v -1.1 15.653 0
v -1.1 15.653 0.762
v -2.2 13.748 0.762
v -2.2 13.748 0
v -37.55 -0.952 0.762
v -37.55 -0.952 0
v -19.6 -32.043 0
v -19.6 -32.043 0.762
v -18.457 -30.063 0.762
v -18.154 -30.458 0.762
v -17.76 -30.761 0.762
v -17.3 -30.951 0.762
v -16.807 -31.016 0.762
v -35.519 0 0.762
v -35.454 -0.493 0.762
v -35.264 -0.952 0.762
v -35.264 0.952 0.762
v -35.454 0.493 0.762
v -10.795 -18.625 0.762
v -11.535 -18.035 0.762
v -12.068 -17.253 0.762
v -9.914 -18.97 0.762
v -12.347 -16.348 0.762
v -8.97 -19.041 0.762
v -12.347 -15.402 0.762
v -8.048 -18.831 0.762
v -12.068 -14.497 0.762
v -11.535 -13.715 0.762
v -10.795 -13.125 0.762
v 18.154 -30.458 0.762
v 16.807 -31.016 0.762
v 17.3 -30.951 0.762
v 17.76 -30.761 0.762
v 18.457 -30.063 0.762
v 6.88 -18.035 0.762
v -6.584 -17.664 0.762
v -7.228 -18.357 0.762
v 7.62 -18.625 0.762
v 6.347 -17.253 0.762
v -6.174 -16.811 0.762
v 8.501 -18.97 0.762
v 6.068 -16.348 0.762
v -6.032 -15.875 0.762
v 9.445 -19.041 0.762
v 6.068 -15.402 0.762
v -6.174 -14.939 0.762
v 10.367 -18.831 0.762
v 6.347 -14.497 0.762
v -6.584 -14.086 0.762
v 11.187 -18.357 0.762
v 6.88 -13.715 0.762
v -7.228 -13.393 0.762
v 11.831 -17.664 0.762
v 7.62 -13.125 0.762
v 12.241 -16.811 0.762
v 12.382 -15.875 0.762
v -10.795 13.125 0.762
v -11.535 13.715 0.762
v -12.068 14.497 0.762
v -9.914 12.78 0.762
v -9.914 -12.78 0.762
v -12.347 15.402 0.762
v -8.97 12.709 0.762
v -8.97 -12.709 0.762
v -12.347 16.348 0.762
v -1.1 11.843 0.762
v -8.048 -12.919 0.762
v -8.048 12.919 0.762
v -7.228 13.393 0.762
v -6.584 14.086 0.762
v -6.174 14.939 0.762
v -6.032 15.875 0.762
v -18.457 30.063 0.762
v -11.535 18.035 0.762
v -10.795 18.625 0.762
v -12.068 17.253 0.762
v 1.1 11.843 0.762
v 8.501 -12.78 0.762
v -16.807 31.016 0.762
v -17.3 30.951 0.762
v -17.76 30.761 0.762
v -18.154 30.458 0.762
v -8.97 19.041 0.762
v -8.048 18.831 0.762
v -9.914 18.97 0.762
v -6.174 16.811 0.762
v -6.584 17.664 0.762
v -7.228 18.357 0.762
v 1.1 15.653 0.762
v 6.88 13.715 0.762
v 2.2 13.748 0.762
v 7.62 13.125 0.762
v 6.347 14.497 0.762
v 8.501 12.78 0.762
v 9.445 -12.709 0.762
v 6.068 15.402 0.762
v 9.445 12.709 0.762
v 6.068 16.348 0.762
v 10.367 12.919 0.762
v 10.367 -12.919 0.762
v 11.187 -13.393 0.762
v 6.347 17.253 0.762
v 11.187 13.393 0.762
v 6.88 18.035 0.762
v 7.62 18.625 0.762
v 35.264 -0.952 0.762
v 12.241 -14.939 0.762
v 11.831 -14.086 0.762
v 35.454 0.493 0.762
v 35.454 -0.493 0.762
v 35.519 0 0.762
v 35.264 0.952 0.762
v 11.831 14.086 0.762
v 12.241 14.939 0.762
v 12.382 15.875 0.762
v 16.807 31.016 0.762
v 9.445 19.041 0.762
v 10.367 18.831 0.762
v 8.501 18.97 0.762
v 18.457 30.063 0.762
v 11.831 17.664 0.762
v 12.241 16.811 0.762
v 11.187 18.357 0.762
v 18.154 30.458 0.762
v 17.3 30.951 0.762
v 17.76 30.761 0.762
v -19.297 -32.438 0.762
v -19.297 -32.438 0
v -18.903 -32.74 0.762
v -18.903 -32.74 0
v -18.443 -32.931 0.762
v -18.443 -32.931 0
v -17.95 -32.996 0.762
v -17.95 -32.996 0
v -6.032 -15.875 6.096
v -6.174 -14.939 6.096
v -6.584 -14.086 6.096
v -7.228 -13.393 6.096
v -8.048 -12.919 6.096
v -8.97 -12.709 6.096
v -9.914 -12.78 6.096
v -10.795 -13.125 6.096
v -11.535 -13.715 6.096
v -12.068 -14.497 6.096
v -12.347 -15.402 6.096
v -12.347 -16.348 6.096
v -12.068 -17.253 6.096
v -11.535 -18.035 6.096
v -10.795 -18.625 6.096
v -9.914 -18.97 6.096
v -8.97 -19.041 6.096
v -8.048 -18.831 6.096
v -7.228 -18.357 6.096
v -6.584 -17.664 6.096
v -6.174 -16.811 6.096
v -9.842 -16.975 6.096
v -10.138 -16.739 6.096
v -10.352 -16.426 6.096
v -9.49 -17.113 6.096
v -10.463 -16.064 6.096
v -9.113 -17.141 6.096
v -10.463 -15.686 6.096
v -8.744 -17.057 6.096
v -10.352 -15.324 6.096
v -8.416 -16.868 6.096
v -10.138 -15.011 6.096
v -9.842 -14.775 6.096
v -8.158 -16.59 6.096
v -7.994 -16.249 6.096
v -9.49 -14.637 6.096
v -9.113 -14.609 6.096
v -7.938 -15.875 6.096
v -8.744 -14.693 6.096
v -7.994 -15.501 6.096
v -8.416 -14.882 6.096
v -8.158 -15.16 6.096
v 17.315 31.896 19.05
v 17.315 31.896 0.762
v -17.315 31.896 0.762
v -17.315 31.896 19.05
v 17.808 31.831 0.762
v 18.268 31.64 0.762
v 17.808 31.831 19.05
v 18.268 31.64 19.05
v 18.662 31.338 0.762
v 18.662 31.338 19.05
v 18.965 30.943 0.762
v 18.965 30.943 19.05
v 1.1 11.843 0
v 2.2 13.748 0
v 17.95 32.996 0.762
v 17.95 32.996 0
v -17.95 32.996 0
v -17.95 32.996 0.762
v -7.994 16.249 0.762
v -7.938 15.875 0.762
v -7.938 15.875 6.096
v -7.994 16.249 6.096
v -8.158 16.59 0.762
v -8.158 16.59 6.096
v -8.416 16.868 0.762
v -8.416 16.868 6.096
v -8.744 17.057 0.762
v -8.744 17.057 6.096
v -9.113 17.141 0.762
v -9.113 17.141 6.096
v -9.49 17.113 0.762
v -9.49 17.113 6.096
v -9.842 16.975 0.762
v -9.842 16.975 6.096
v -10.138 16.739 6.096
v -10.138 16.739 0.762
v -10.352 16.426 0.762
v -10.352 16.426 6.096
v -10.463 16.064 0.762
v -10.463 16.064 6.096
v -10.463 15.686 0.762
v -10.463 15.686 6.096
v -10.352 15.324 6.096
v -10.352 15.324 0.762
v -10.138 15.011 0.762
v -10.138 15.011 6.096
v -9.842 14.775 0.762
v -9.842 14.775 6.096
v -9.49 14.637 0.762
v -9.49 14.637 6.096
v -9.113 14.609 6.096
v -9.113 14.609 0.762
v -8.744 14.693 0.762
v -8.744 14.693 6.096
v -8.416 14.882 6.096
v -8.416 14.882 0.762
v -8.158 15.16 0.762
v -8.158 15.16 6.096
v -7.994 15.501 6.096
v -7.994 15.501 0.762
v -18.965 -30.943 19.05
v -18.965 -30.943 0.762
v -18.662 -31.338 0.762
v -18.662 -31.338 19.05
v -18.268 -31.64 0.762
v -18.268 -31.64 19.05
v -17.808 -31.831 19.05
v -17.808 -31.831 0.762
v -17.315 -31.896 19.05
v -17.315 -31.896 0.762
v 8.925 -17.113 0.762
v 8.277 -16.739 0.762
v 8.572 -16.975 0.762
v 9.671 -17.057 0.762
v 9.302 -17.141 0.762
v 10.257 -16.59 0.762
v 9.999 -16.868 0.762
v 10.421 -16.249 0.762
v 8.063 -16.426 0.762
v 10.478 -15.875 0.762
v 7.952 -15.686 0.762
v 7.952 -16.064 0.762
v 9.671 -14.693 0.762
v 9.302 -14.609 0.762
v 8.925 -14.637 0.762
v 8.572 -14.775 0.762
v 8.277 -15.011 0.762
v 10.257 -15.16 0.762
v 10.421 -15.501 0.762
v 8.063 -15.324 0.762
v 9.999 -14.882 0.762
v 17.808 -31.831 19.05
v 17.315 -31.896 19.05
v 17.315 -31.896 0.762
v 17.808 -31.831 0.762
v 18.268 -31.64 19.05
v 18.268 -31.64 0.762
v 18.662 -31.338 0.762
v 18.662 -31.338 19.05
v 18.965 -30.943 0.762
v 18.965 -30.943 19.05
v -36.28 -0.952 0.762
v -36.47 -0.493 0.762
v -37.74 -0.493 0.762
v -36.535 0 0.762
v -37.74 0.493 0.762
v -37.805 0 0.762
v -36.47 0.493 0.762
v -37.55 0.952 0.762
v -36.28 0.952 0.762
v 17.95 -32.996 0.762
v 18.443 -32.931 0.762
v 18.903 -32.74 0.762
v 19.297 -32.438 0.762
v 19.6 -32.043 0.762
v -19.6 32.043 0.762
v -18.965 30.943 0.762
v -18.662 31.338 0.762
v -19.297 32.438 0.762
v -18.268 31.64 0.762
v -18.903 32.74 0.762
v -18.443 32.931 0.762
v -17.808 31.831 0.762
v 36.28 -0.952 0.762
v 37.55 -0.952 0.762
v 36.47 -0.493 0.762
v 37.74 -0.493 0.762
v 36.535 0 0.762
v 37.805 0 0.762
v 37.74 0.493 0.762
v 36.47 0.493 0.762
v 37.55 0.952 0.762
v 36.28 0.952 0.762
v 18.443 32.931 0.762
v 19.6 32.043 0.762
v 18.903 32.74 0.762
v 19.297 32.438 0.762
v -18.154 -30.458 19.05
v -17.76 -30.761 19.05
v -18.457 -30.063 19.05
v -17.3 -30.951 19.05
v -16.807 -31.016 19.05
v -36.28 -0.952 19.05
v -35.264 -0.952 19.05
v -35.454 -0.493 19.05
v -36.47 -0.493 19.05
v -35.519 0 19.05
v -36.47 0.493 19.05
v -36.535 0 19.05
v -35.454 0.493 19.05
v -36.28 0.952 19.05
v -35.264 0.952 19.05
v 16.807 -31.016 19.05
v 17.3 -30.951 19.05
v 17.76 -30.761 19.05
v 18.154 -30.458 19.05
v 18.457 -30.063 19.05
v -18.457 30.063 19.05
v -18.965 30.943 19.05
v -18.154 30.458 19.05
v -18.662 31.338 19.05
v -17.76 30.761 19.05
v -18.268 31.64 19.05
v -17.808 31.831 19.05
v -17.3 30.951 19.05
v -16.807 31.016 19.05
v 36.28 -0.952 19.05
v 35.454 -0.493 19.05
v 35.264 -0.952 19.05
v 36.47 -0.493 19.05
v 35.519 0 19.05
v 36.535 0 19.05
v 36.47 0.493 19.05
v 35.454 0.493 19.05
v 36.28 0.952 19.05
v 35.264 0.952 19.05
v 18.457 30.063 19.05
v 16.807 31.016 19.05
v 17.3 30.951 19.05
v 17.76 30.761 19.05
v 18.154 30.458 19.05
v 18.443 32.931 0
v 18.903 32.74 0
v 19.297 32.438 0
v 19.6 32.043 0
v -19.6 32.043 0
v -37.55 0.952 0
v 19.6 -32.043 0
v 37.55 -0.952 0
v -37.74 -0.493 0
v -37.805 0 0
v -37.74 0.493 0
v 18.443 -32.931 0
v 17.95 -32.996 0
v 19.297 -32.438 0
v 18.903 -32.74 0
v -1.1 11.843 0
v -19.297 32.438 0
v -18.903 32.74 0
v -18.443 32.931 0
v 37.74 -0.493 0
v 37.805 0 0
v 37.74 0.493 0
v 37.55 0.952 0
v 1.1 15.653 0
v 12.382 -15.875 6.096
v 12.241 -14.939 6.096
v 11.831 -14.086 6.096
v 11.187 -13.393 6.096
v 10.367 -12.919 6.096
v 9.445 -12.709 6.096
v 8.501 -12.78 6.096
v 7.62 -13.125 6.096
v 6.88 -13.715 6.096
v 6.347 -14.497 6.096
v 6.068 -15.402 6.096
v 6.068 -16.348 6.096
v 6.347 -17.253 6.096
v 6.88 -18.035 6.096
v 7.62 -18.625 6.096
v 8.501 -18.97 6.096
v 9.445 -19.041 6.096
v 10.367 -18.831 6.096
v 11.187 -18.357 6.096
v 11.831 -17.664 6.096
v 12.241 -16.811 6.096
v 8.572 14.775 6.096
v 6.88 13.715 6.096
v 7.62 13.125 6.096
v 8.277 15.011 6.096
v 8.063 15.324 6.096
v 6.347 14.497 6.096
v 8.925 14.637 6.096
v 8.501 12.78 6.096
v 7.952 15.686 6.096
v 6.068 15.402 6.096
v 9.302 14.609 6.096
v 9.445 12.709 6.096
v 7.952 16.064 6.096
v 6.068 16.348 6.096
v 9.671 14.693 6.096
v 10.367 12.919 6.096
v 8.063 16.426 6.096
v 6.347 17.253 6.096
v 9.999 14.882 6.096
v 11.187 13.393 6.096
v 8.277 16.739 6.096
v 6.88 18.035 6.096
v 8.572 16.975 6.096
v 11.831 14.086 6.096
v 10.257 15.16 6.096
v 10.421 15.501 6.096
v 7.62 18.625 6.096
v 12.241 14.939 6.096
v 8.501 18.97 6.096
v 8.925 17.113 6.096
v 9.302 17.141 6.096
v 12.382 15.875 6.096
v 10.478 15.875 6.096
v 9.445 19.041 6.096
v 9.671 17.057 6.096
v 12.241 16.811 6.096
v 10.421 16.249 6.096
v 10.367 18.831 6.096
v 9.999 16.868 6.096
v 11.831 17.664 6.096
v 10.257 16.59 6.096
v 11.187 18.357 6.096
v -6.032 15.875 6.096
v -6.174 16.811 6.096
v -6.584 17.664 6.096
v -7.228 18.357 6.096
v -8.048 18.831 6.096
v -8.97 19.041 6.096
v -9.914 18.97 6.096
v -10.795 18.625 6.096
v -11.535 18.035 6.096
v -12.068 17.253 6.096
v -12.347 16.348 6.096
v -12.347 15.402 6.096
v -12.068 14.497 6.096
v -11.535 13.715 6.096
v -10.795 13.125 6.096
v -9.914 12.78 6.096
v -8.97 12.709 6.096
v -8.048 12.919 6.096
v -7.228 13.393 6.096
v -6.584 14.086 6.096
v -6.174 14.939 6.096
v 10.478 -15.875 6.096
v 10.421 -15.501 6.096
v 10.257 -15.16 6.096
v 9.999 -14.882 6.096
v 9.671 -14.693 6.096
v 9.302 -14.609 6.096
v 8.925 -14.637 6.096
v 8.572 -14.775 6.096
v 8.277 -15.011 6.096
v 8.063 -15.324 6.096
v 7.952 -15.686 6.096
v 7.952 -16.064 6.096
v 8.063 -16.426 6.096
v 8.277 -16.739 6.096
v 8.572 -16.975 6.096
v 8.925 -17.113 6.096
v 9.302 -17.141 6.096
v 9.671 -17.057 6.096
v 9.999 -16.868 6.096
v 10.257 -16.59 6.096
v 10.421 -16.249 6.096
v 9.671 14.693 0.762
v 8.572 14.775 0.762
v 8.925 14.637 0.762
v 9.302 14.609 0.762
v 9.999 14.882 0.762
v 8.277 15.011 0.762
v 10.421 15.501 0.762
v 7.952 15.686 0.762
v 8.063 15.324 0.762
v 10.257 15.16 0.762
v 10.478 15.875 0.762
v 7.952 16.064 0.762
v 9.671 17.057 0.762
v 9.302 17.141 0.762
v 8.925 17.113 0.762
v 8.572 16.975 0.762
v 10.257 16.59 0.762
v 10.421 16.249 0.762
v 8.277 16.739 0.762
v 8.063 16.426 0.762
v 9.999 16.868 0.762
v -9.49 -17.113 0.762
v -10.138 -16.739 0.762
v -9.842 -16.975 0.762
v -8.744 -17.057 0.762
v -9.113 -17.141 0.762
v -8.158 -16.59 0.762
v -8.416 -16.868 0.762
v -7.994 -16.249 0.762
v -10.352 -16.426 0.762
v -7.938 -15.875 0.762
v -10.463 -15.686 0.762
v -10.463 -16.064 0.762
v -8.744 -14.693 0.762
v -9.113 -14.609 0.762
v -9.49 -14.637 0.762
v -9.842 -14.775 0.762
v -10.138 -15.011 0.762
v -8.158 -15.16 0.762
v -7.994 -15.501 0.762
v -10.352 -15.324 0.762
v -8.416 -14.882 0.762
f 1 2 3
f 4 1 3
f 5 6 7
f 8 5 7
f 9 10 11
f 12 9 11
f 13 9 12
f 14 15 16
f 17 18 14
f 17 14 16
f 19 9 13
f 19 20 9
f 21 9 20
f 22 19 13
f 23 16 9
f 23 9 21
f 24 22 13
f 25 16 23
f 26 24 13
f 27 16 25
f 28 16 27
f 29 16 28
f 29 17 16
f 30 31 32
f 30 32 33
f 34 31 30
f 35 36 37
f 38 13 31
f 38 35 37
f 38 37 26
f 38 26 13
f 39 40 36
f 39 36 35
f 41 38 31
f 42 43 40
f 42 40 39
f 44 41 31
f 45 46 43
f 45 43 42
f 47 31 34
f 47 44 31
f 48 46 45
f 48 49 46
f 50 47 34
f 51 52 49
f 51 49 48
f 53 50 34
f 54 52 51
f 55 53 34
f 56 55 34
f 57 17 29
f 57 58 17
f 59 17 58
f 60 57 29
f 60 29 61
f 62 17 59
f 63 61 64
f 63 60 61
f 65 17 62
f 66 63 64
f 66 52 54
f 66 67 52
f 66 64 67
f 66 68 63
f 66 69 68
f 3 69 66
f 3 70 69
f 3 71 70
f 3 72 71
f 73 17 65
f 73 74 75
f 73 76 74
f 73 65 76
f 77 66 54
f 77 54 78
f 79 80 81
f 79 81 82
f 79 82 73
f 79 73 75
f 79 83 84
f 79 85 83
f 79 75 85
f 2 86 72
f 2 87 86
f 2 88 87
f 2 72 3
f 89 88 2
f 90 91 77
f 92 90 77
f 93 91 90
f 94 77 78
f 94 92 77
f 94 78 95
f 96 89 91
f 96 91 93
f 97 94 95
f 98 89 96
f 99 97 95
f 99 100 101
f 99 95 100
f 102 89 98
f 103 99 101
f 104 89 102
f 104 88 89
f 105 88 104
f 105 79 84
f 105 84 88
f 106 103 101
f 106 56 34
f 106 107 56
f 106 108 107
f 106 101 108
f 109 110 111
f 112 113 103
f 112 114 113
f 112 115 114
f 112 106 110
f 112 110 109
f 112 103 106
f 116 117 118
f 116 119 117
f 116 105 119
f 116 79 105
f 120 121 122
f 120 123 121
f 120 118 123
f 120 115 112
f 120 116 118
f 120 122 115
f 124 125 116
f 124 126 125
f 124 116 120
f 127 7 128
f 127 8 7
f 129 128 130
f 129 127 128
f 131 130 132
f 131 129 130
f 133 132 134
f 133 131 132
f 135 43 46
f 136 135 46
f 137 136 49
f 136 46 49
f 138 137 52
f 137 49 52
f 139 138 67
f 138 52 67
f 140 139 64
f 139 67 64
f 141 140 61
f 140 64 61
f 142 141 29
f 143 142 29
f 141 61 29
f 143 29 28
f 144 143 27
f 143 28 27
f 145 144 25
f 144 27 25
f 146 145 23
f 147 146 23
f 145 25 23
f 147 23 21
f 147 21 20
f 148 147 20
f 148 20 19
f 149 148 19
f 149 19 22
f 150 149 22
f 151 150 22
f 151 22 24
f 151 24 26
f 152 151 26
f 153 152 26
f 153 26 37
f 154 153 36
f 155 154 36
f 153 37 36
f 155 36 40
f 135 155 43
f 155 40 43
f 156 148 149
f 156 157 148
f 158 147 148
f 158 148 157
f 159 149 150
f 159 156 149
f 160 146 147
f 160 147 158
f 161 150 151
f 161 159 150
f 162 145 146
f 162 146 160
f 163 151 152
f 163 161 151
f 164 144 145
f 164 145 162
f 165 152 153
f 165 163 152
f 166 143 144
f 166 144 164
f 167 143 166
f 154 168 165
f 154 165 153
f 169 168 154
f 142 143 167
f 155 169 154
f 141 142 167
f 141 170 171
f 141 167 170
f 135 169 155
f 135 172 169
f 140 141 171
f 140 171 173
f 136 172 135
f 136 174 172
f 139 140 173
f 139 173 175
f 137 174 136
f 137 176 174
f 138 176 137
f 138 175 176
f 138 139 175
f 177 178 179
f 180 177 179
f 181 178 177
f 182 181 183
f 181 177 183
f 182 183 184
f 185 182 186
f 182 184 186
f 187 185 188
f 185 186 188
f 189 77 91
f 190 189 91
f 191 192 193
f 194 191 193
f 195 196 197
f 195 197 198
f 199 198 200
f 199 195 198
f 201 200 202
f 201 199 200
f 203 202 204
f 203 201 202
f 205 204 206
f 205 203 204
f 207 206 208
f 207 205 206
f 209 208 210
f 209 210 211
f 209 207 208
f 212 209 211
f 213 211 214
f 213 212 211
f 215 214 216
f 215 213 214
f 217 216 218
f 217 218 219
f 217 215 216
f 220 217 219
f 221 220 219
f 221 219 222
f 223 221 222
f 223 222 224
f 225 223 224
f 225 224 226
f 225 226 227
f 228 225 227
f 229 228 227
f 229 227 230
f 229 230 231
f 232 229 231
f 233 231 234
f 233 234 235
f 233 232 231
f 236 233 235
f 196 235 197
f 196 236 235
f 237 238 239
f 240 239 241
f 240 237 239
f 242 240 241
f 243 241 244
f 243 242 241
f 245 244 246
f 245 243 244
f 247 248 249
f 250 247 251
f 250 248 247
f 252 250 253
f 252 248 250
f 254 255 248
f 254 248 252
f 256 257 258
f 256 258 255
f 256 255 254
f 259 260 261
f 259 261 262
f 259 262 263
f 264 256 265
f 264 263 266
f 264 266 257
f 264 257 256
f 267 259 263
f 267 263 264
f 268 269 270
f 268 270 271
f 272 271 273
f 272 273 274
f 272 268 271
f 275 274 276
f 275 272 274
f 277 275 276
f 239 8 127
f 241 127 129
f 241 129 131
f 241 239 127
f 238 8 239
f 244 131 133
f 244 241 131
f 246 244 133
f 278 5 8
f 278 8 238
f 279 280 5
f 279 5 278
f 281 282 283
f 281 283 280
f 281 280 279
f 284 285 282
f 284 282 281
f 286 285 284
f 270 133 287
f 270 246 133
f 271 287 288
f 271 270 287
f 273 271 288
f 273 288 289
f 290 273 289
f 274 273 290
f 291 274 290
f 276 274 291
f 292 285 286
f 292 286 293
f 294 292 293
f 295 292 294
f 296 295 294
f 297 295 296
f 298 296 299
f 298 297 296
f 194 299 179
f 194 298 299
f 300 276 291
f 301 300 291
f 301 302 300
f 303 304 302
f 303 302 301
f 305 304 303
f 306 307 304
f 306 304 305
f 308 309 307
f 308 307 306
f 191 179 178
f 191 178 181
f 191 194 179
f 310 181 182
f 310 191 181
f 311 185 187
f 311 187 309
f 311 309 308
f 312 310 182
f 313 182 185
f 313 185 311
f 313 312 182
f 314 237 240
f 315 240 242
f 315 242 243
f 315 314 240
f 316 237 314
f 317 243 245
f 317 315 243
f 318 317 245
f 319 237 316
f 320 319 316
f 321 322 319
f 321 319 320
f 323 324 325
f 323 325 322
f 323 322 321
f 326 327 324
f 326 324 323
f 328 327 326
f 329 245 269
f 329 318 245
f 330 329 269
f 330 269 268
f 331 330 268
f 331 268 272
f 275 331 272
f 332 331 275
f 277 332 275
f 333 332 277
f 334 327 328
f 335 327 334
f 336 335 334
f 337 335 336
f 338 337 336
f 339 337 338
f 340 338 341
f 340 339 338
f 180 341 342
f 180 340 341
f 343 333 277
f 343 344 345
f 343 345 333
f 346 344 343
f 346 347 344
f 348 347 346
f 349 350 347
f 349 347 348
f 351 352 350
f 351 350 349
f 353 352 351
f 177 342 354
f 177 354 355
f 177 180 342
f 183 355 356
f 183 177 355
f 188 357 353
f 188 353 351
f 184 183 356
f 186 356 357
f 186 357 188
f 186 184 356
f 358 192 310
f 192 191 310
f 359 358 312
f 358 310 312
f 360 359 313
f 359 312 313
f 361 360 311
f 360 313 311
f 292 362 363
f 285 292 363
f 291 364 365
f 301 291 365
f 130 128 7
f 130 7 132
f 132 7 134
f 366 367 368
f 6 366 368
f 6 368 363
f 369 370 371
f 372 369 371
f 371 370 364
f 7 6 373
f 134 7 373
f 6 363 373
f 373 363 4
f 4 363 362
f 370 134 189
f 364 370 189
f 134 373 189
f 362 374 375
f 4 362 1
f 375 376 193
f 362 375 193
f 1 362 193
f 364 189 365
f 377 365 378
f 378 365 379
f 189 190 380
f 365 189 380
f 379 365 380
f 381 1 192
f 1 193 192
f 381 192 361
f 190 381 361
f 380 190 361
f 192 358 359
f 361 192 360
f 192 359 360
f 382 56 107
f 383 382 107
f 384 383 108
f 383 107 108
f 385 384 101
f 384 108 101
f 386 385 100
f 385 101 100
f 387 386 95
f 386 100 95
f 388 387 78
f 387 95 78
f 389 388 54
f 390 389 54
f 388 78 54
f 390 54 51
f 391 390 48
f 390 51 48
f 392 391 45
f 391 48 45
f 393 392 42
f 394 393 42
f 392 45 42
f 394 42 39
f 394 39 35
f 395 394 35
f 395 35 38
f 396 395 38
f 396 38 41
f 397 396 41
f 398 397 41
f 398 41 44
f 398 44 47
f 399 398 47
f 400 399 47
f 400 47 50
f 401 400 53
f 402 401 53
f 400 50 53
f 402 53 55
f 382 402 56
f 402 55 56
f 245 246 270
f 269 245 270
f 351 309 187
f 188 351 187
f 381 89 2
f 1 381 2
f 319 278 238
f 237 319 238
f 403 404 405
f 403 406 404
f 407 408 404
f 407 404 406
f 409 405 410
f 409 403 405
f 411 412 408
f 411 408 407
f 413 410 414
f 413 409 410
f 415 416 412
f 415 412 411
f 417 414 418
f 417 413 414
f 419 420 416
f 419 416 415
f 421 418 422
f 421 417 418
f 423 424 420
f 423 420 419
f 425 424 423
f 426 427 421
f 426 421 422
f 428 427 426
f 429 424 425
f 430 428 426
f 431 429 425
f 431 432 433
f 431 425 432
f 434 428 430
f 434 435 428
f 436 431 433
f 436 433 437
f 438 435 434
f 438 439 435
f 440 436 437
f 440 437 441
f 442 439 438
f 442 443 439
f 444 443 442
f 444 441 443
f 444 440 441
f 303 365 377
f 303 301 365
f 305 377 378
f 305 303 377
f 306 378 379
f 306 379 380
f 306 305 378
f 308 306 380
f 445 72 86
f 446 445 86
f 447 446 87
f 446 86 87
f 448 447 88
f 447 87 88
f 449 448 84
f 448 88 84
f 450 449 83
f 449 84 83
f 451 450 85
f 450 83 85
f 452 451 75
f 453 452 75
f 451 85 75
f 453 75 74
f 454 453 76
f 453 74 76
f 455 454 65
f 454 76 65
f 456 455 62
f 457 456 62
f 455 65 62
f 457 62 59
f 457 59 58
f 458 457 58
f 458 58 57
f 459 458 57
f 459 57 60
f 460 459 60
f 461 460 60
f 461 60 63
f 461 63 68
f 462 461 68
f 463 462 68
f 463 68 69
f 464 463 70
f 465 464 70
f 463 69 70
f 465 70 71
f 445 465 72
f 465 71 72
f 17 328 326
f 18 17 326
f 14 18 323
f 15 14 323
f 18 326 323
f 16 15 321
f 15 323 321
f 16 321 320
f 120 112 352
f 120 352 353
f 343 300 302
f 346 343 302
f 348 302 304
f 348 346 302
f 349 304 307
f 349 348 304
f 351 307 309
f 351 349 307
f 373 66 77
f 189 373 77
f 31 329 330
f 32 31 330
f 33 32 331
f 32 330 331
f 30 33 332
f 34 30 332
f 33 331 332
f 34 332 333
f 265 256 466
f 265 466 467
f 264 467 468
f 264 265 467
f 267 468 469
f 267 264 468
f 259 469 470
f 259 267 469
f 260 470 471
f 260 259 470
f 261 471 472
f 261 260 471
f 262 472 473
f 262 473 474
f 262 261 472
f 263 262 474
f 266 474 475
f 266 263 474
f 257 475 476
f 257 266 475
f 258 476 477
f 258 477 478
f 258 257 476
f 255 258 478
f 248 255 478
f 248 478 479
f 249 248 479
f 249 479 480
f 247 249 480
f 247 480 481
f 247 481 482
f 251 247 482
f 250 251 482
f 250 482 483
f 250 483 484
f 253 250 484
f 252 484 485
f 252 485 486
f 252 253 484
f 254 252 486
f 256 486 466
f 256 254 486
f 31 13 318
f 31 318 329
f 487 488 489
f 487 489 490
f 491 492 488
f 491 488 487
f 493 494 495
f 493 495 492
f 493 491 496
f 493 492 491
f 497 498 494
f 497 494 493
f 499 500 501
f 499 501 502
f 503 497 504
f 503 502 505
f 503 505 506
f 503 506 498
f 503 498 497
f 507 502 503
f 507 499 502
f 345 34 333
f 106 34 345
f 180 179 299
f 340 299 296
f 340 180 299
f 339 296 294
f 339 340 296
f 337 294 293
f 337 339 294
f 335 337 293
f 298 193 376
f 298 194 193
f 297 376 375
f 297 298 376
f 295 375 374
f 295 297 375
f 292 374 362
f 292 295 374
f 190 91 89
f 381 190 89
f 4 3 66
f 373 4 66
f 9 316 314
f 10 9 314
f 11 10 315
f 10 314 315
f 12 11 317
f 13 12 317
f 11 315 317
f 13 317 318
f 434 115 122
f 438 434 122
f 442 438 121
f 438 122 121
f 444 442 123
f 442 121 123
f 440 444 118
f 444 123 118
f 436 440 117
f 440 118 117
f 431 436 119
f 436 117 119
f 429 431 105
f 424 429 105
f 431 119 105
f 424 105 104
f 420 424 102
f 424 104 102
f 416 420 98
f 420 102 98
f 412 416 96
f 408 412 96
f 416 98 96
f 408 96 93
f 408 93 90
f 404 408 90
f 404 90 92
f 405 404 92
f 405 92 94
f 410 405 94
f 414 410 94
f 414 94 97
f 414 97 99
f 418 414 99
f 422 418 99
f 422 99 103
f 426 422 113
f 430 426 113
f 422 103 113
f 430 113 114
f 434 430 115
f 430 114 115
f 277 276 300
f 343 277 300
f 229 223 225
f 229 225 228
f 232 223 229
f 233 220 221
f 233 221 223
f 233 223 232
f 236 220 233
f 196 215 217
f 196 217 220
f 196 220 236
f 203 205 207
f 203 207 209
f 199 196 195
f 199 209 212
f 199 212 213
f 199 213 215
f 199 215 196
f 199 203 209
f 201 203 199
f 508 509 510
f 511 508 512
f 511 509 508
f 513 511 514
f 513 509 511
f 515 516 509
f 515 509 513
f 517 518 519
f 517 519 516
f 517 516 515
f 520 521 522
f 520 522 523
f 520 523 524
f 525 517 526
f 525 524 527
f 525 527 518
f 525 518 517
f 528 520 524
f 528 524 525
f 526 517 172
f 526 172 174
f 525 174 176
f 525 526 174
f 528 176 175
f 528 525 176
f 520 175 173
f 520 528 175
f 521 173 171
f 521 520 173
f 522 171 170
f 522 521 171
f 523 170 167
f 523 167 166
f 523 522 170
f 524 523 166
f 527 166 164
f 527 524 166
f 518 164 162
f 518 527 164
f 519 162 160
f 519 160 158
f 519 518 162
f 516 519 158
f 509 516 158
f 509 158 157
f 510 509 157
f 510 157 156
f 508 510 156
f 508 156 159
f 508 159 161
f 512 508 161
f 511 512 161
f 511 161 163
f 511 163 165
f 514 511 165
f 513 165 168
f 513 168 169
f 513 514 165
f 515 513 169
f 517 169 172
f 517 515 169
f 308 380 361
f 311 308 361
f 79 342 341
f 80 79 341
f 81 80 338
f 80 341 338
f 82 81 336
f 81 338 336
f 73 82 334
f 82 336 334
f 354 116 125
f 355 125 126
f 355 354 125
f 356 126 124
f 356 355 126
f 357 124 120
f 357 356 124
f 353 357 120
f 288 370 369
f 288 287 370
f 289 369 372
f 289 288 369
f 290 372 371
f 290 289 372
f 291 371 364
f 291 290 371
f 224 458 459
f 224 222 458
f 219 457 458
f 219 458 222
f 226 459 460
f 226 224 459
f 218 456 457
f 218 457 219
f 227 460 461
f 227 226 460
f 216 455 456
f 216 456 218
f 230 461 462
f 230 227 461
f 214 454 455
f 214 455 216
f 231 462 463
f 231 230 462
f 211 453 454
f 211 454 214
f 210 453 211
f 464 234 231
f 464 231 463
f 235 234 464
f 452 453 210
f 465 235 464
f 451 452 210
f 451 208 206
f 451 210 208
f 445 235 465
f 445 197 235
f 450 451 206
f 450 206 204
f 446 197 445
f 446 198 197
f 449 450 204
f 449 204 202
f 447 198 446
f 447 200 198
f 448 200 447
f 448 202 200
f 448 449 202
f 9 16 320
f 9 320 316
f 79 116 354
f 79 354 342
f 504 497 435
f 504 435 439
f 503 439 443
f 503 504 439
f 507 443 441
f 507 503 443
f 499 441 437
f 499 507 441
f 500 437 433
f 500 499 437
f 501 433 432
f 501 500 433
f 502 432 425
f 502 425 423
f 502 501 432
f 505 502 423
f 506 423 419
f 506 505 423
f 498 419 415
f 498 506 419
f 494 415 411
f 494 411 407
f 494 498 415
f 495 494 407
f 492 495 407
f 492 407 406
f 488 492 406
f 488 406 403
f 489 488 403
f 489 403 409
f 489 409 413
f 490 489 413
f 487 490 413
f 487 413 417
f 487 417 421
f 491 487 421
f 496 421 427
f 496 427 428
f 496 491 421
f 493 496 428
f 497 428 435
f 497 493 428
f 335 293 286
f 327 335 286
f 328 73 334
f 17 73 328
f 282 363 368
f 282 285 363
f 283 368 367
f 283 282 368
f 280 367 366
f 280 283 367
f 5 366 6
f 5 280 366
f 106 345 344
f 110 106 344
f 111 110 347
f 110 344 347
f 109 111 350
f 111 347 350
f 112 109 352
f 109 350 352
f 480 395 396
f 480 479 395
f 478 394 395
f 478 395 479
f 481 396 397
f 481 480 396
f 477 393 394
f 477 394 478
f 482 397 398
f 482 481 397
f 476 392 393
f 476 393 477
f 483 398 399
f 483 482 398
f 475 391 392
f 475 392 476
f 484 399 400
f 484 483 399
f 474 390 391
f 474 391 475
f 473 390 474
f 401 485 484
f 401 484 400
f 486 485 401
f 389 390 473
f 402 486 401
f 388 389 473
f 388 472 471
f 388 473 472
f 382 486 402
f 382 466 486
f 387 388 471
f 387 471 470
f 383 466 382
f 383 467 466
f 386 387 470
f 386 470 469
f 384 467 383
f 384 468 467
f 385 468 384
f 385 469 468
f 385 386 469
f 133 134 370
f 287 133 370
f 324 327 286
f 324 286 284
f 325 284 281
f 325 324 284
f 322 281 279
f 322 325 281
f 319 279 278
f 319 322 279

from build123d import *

# Parameters (mm, degrees)
F1_DEPTH  = 0.762
F2_R      = 1.905
F4_DEPTH  = 19.05
F5_R      = 1.905
F7_DEPTH  = 25.4
F8_R      = 1.905
F11_R     = 3.175
F11_R_2   = 1.27
F12_DEPTH = 5.334
F13_DEPTH = 2.54


with BuildPart() as f1:
    # F0 (on Top) → F1 (new body)
    with BuildSketch(Plane.XY):
        Polygon((19.05, 32.995568), (-19.05, 32.995568), (-38.1, 0), (-19.05, -32.995568), (19.05, -32.995568), (38.1, 0), align=None)
    extrude(amount=F1_DEPTH)

    # F2
    f2_edges = [f1.edges().sort_by_distance(p)[0] for p in [
        (38.1, 0, 0.381),
        (19.05, 32.995568, 0.381),
        (-19.05, 32.995568, 0.381),
        (-38.1, 0, 0.381),
        (-19.05, -32.995568, 0.381),
        (19.05, -32.995568, 0.381),
    ]]
    fillet(f2_edges, radius=F2_R)



with BuildPart() as f4:
    # F3 (on Top) → F4 (new body)
    with BuildSketch(Plane.XY):
        Polygon((18.415, 31.895716), (-18.415, 31.895716), (-36.83, 0), (-18.415, -31.895716), (18.415, -31.895716), (36.83, 0), align=None)
    extrude(amount=F4_DEPTH)

    # F5
    f5_edges = [f4.edges().sort_by_distance(p)[0] for p in [
        (-18.415, -31.895716, 9.525),
        (18.415, -31.895716, 9.525),
        (36.83, 0, 9.525),
        (-36.83, 0, 9.525),
        (18.415, 31.895716, 9.525),
        (-18.415, 31.895716, 9.525),
    ]]
    fillet(f5_edges, radius=F5_R)


with BuildPart() as f7:
    # F6 (on Top) → F7 (new body)
    with BuildSketch(Plane.XY):
        Polygon((17.907, 31.015834), (-17.907, 31.015834), (-35.814, 0), (-17.907, -31.015834), (17.907, -31.015834), (35.814, 0), align=None)
    extrude(amount=F7_DEPTH)

    # F8
    f8_edges = [f7.edges().sort_by_distance(p)[0] for p in [
        (-17.907, -31.015834, 12.7),
        (17.907, -31.015834, 12.7),
        (35.814, 0, 12.7),
        (-35.814, 0, 12.7),
        (17.907, 31.015834, 12.7),
        (-17.907, 31.015834, 12.7),
    ]]
    fillet(f8_edges, radius=F8_R)


with BuildPart() as f7_1:
    # F9: moved
    add(f7.part.moved(Location((0, 0, 0.762))))


with BuildPart() as f4_1:
    add(f4.part)

    # F10: cut F7
    add(f7_1.part, mode=Mode.SUBTRACT)


with BuildPart() as f1_1:
    add(f1.part)

    add(f4_1.part)  # F12 merges F4
    # F11 (on face) → F12 (join)
    with BuildSketch(Plane.XY.offset(0.762)):
        with Locations((-9.2075, 15.875)):
            Circle(F11_R)
        with Locations((-9.2075, 15.875)):
            Circle(F11_R_2, mode=Mode.SUBTRACT)
        with Locations((9.2075, 15.875)):
            Circle(F11_R)
        with Locations((9.2075, 15.875)):
            Circle(F11_R_2, mode=Mode.SUBTRACT)
        with Locations((9.2075, -15.875)):
            Circle(F11_R)
        with Locations((9.2075, -15.875)):
            Circle(F11_R_2, mode=Mode.SUBTRACT)
        with Locations((-9.2075, -15.875)):
            Circle(F11_R)
        with Locations((-9.2075, -15.875)):
            Circle(F11_R_2, mode=Mode.SUBTRACT)
    extrude(amount=F12_DEPTH)

    # F11 (on face) → F13 (cut)
    with BuildSketch(Plane.XY.offset(0.762)):
        Polygon((-1.099852, 11.84275), (1.099852, 11.84275), (2.199705, 13.74775), (1.099852, 15.65275), (-1.099852, 15.65275), (-2.199705, 13.74775), align=None)
    extrude(amount=-F13_DEPTH, mode=Mode.SUBTRACT)


solid = f1_1.part
